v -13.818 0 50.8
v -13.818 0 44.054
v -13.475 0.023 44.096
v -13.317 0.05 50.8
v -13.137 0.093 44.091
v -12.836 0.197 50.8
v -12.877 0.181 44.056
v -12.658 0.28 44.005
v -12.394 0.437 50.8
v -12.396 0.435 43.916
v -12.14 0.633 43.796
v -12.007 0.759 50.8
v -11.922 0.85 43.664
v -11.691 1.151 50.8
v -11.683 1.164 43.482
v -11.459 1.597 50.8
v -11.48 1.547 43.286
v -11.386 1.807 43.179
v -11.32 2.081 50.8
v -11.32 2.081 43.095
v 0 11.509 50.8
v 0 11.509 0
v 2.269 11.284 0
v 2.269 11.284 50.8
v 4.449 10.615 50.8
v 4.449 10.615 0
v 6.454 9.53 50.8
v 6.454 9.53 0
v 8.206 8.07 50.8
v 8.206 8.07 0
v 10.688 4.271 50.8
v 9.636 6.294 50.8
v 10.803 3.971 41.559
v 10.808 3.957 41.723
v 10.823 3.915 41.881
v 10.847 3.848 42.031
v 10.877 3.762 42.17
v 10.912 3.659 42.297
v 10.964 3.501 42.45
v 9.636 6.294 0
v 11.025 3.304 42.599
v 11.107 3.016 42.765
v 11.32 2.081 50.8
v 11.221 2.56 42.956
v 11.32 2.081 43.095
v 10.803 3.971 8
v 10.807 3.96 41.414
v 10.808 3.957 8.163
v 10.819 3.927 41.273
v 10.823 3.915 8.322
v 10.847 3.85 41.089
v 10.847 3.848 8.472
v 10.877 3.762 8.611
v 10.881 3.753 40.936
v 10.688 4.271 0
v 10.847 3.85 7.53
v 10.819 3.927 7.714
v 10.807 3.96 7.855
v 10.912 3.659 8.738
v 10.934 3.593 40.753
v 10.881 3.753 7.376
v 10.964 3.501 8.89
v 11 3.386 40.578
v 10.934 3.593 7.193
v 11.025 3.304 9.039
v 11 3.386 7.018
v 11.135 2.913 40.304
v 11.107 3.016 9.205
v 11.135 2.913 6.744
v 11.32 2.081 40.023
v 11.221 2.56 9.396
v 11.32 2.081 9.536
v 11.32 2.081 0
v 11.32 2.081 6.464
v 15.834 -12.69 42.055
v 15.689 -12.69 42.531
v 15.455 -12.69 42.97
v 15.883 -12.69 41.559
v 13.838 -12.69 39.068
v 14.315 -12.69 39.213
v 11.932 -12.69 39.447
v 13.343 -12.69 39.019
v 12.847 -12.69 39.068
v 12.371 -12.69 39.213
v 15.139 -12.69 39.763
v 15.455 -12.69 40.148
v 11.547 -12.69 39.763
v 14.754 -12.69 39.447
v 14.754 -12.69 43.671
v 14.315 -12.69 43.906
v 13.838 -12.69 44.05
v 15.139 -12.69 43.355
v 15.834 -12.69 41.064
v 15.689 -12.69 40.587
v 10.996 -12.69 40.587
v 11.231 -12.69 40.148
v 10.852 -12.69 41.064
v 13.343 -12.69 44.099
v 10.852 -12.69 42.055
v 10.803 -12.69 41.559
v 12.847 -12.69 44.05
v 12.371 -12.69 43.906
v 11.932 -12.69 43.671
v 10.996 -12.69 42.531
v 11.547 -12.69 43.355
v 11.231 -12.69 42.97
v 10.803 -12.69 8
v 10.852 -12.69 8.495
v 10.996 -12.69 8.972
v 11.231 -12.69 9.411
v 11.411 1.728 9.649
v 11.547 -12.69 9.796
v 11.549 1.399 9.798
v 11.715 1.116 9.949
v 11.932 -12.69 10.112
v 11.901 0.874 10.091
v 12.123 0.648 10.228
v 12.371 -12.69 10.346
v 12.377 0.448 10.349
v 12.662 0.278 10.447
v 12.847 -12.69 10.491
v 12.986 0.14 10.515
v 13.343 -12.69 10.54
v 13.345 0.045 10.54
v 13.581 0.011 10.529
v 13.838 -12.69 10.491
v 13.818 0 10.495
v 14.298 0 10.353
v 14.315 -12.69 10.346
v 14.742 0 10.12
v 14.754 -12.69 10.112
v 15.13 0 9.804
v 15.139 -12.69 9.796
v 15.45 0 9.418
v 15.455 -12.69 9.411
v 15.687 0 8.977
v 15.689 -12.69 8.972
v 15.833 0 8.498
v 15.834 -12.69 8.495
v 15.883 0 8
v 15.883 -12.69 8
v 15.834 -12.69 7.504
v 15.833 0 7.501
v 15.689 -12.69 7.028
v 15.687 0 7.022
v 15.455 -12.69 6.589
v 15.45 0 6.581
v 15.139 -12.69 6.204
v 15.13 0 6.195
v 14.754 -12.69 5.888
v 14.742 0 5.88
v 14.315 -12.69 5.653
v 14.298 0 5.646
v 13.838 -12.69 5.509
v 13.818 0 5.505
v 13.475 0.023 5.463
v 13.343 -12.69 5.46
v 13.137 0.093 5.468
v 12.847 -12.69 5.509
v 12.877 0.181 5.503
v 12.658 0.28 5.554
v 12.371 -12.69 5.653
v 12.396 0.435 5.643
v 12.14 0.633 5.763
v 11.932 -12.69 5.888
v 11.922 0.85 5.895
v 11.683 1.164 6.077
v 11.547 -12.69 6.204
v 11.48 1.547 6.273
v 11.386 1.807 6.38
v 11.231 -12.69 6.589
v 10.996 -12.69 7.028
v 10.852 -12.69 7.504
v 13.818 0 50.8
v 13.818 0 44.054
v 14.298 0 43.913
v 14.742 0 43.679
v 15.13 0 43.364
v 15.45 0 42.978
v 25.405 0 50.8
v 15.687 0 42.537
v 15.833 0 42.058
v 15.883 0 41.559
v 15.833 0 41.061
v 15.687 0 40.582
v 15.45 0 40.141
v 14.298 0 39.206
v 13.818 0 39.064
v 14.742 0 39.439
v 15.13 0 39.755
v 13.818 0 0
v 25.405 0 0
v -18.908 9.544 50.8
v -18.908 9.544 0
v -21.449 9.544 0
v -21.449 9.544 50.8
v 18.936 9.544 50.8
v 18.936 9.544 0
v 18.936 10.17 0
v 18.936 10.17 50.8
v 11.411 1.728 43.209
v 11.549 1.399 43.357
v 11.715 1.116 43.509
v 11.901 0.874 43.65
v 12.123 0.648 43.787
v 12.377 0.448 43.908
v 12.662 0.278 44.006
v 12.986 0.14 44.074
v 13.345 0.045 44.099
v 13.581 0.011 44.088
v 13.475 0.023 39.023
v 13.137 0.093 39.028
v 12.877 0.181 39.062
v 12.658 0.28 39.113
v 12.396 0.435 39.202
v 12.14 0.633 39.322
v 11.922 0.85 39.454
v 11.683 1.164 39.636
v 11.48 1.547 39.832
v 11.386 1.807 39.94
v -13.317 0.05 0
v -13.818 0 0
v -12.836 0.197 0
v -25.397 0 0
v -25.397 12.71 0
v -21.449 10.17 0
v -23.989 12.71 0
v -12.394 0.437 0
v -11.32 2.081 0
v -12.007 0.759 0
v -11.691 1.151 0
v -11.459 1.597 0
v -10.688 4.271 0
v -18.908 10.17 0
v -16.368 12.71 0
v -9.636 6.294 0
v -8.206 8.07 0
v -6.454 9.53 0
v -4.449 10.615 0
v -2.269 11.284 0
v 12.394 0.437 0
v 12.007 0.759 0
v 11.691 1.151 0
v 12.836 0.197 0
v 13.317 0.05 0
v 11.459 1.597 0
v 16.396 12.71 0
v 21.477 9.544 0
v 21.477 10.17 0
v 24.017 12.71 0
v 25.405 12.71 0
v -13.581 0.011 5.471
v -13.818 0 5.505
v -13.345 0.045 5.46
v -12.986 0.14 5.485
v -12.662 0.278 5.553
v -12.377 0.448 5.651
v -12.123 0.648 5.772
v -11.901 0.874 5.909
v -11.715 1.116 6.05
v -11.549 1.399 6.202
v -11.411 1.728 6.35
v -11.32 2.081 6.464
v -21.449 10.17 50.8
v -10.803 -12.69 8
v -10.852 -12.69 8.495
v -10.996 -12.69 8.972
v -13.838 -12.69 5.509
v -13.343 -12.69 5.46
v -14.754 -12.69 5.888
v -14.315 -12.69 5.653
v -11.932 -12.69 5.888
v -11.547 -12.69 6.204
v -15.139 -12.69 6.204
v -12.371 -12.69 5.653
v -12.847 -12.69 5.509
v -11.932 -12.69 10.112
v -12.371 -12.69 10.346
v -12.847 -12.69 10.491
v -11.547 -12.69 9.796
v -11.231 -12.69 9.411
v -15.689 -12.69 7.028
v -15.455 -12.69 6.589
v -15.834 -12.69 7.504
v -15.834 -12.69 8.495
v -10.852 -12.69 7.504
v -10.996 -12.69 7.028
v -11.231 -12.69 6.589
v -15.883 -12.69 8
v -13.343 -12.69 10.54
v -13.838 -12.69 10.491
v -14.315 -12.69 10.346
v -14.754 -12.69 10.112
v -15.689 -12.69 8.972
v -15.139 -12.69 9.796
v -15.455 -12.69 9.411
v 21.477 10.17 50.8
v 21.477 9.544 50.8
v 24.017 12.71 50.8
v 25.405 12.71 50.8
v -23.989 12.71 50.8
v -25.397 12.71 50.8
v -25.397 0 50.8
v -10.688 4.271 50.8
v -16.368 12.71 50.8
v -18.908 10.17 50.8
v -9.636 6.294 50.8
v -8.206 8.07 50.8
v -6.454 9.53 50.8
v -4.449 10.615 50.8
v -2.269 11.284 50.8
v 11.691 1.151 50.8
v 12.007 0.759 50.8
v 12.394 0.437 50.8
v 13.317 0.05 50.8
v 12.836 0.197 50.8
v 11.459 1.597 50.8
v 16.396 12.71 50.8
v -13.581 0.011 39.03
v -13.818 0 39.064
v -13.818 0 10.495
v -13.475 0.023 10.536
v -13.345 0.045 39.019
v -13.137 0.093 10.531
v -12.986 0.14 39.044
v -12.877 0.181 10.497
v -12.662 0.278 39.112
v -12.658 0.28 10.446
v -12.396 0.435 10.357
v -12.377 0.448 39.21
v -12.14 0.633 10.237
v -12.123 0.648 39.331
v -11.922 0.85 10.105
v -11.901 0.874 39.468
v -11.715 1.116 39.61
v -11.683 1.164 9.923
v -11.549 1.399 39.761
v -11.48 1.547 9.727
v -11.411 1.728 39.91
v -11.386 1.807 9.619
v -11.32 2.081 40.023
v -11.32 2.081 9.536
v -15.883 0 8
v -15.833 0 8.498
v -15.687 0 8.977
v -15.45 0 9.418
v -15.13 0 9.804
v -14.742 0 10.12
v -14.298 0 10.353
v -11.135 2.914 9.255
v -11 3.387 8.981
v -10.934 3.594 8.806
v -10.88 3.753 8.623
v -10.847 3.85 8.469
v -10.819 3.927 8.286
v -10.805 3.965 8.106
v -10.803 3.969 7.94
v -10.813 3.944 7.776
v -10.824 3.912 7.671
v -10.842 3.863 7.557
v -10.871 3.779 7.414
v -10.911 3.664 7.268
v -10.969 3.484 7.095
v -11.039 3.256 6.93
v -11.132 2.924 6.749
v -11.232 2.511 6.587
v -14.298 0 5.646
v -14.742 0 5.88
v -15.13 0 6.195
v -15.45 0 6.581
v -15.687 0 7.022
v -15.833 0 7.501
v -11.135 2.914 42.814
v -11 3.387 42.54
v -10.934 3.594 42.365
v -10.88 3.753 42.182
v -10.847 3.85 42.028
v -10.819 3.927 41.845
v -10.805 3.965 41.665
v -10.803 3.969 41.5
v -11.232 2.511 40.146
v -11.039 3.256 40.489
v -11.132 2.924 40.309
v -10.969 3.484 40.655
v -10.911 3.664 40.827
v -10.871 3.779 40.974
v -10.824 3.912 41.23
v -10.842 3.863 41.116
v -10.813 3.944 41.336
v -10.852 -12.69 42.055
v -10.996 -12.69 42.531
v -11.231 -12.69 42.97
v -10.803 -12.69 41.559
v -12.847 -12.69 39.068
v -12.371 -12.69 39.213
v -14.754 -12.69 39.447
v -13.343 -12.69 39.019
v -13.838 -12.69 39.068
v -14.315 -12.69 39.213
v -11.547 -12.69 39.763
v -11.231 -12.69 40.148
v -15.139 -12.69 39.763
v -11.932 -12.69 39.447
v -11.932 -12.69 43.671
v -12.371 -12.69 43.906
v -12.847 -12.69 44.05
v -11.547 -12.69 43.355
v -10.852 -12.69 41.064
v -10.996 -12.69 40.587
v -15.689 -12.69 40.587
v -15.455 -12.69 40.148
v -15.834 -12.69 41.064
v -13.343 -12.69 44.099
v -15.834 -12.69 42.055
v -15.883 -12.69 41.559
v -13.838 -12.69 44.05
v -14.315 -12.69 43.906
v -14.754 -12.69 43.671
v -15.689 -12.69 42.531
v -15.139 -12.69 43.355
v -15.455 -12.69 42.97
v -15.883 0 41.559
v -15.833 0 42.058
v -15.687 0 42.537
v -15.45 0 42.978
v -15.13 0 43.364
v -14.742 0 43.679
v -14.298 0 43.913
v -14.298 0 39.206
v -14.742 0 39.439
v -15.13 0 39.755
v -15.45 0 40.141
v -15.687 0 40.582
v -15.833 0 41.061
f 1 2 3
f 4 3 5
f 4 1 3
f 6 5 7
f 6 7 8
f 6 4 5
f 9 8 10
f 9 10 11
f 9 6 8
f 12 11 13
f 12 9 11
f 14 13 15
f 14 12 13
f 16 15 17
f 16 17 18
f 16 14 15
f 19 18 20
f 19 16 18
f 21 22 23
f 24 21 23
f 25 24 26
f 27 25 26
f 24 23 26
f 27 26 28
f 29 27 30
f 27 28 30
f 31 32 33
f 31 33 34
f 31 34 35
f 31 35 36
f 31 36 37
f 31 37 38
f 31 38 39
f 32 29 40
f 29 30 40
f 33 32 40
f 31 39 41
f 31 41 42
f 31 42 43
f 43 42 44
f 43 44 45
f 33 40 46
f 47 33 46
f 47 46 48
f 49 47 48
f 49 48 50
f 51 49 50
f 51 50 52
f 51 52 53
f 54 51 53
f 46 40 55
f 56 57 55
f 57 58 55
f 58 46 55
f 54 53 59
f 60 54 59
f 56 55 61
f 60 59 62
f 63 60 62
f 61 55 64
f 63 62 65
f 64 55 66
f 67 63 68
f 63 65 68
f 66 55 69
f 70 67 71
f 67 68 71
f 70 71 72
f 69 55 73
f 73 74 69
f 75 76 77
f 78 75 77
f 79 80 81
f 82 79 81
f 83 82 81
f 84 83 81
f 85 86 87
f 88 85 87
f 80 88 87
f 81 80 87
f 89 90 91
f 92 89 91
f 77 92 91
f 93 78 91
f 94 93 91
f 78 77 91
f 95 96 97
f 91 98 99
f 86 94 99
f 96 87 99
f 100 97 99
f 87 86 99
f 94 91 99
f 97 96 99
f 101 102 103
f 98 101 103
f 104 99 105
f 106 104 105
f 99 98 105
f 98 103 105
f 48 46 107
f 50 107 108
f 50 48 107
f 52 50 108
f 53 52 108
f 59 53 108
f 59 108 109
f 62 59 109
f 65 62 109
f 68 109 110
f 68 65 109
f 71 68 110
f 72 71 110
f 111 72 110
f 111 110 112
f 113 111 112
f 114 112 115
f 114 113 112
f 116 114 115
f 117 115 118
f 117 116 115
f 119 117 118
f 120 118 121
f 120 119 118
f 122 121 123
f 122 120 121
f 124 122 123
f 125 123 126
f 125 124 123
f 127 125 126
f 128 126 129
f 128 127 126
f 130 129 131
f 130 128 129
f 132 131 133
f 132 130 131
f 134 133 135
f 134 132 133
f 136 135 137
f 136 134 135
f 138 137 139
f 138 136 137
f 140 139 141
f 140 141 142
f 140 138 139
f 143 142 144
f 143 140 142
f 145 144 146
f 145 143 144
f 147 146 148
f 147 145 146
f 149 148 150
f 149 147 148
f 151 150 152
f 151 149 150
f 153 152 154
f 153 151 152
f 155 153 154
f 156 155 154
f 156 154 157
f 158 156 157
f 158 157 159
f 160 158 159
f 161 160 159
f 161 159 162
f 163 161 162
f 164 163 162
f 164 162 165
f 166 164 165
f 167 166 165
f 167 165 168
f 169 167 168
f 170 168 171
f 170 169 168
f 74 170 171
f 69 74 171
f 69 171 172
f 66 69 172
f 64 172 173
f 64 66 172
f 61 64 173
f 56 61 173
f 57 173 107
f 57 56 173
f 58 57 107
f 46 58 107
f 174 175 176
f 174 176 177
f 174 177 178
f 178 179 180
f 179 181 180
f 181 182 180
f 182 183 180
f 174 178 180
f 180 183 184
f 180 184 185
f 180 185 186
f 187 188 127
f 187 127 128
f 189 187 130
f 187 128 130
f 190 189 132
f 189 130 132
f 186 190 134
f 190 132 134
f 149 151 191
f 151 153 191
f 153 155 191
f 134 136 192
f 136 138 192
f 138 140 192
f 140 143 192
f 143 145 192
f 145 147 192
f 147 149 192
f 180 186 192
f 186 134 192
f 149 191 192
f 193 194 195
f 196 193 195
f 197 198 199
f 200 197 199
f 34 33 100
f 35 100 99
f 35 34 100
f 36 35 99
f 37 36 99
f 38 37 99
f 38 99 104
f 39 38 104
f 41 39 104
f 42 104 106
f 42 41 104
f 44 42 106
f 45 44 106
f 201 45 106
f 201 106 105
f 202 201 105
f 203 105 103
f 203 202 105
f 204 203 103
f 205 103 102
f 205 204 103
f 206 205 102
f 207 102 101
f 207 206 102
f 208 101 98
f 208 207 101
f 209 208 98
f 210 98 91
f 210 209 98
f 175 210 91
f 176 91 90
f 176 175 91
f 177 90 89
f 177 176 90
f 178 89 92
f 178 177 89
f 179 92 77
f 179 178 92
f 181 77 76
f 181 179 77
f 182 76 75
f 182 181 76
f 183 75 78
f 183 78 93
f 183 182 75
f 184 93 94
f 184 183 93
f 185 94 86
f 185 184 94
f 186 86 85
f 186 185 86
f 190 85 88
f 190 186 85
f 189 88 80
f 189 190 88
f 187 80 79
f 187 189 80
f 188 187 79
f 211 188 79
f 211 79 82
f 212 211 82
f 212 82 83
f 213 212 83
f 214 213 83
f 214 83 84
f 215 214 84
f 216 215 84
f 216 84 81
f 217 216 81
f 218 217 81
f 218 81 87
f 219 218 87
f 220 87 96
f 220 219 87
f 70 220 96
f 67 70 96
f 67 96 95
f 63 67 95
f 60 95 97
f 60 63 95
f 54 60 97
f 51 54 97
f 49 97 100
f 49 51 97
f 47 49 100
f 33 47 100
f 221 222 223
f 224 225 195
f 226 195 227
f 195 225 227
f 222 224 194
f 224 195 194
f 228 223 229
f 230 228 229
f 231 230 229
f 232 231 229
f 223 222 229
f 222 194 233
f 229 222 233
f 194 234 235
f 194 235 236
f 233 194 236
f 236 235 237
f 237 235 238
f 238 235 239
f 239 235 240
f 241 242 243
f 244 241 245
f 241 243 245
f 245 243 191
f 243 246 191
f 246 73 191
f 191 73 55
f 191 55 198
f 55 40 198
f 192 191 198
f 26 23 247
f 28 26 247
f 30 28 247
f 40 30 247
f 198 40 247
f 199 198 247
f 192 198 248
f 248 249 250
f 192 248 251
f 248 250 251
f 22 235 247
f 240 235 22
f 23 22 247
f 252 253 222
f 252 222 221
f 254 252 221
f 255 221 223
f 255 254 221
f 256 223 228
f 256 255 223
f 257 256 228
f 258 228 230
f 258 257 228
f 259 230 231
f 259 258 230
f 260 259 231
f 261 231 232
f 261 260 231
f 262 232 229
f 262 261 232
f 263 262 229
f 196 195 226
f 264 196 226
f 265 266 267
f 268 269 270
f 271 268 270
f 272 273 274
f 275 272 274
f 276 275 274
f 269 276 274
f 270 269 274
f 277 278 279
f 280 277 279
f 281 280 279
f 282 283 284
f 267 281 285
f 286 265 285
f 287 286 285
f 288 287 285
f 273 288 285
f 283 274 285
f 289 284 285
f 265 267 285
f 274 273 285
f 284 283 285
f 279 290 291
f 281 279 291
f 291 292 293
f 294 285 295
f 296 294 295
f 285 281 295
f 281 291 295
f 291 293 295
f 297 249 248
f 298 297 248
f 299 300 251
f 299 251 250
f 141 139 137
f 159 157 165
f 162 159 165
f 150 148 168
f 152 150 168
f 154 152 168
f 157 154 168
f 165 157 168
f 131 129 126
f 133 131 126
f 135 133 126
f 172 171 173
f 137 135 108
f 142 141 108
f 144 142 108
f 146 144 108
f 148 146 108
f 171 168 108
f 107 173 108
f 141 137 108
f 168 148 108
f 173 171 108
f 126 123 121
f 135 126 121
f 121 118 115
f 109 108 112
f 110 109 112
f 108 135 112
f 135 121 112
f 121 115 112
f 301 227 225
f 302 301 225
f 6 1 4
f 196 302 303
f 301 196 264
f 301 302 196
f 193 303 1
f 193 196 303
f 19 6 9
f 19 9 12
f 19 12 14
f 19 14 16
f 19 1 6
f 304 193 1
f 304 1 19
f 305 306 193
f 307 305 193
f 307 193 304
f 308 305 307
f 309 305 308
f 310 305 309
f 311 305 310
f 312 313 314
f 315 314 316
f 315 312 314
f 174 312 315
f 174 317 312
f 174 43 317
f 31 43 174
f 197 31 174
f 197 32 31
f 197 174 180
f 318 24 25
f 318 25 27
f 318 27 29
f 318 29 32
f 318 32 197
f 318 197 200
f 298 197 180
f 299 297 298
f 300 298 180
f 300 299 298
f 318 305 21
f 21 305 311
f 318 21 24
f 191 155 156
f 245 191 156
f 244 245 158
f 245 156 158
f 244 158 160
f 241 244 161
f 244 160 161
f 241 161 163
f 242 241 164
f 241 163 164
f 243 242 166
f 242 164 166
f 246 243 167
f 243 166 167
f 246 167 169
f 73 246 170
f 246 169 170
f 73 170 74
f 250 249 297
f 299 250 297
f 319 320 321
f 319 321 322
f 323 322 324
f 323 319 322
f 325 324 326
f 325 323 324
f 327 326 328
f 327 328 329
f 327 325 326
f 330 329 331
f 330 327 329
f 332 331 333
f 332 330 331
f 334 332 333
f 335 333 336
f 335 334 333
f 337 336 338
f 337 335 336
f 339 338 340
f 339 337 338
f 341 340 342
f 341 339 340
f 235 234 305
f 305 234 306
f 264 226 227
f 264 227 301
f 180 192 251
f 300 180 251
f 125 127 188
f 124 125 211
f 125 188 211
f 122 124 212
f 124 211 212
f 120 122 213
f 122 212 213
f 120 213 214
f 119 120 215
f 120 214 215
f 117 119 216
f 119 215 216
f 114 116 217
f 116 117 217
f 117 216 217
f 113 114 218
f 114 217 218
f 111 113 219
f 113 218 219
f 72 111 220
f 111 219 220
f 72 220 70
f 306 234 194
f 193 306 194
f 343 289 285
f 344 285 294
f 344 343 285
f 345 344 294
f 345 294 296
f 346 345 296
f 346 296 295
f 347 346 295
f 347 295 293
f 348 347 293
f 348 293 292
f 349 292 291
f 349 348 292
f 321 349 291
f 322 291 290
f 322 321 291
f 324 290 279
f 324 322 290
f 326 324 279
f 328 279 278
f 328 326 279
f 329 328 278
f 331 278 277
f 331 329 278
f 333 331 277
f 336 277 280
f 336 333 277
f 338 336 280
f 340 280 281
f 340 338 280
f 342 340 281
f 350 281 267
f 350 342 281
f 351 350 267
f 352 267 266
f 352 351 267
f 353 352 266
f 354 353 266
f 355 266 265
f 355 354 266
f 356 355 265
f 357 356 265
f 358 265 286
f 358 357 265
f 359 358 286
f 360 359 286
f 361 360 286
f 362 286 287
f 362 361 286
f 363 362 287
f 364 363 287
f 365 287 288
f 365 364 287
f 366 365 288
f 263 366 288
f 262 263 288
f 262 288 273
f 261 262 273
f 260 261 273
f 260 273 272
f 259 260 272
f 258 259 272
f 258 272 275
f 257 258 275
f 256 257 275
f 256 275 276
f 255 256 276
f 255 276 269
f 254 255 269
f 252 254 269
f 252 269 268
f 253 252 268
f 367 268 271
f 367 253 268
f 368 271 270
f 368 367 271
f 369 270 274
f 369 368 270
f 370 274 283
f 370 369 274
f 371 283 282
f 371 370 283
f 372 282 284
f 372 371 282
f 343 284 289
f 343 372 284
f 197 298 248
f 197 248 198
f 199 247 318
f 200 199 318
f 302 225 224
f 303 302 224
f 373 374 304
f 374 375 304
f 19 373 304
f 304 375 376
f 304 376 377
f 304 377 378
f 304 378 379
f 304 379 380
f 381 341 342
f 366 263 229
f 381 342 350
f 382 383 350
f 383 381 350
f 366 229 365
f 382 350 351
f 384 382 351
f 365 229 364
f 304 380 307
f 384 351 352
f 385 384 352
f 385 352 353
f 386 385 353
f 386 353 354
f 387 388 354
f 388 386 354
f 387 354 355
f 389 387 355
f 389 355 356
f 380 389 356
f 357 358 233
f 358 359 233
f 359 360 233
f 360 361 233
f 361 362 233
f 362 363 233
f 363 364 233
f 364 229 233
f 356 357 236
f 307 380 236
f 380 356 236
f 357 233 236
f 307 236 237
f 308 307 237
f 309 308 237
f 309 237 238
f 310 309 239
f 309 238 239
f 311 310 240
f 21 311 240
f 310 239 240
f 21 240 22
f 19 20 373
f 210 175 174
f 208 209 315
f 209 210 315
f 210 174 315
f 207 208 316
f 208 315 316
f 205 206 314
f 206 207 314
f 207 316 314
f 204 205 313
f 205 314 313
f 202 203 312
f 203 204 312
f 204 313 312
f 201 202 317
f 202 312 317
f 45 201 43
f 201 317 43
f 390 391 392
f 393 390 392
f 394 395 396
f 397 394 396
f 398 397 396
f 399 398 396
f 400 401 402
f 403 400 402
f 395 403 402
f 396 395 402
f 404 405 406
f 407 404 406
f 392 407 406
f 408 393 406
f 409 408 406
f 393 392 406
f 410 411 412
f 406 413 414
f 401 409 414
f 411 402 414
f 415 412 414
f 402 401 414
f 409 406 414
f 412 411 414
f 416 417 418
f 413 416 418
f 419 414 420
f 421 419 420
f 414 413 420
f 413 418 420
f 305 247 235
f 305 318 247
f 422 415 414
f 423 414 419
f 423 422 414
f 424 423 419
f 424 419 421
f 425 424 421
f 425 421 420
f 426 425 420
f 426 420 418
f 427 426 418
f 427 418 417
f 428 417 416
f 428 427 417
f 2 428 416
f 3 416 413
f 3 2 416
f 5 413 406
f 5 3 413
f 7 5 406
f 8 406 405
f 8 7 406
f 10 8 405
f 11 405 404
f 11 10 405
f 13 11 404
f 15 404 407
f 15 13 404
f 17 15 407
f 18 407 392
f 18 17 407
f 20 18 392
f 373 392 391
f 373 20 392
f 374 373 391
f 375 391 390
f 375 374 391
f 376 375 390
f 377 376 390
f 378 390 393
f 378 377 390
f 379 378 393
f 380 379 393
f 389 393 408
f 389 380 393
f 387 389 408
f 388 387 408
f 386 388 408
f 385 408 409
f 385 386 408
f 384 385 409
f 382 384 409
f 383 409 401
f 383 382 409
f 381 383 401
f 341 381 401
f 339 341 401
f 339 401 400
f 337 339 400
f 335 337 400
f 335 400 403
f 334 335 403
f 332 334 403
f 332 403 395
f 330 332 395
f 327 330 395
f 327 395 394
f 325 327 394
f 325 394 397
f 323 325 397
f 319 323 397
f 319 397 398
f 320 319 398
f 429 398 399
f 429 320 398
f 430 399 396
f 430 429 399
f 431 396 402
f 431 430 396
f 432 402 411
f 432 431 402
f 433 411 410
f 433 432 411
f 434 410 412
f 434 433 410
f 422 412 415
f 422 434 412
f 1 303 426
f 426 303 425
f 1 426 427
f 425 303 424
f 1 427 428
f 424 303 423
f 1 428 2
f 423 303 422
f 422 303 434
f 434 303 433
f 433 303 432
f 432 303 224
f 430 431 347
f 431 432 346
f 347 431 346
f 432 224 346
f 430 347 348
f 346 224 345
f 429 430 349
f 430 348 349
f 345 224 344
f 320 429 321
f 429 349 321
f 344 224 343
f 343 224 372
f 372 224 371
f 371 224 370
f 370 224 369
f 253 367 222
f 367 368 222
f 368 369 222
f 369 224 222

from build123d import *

# Parameters (mm, degrees)
F1_DEPTH = 50.8
F2_SIZE  = 2.54
F3_SIZE  = 2.54
F4_SIZE  = 2.54
F5_R     = 2.54
F6_R     = 2.54
F7_DEPTH = 25.4


with BuildPart() as f1:
    # F0 (on Top) → F1 (new body)
    with BuildSketch(Plane.XY):
        with BuildLine():
            Line((-25.396921, 0), (-11.509477, 0))
            ThreePointArc((-11.509477, 0), (-8.138429, 8.138429), (0, 11.509477))
            Line((0, 11.509477), (0, 12.709918))
            Line((0, 12.709918), (-18.907823, 12.709918))
            Line((-18.907823, 12.709918), (-18.907823, 9.544055))
            Line((-18.907823, 9.544055), (-21.449404, 9.544055))
            Line((-21.449404, 9.544055), (-21.449404, 12.709918))
            Line((-21.449404, 12.709918), (-25.396921, 12.709918))
            Line((-25.396921, 12.709918), (-25.396921, 0))
        make_face()
        with BuildLine():
            Line((0, 12.709918), (0, 11.509477))
            ThreePointArc((0, 11.509477), (8.138429, 8.138429), (11.509477, 0))
            Line((11.509477, 0), (25.405249, 0))
            Line((25.405249, 0), (25.405249, 12.709918))
            Line((25.405249, 12.709918), (21.477405, 12.709918))
            Line((21.477405, 12.709918), (21.477405, 9.544055))
            Line((21.477405, 9.544055), (18.936489, 9.544055))
            Line((18.936489, 9.544055), (18.936489, 12.709918))
            Line((18.936489, 12.709918), (0, 12.709918))
        make_face()
    extrude(amount=F1_DEPTH)

    # F2
    f2_edges = [f1.edges().sort_by_distance(p)[0] for p in [
        (21.477405, 12.709918, 25.4),
    ]]
    chamfer(f2_edges, length=F2_SIZE)

    # F3
    f3_edges = [f1.edges().sort_by_distance(p)[0] for p in [
        (-21.449404, 12.709918, 25.4),
        (18.936489, 12.709918, 25.4),
    ]]
    chamfer(f3_edges, length=F3_SIZE)

    # F4
    f4_edges = [f1.edges().sort_by_distance(p)[0] for p in [
        (-18.907823, 12.709918, 25.4),
    ]]
    chamfer(f4_edges, length=F4_SIZE)

    # F5
    f5_edges = [f1.edges().sort_by_distance(p)[0] for p in [
        (-11.509477, 0, 25.4),
        (11.509477, 0, 25.4),
    ]]
    fillet(f5_edges, radius=F5_R)

    # F6 (on face) → F7 (join)
    with BuildSketch(Plane(origin=(0, 12.709918, 0), x_dir=(-1, 0, 0), z_dir=(0, 1, 0))):
        with Locations((-13.342786, 41.559178)):
            Circle(F6_R)
        with Locations((13.342786, 41.559178)):
            Circle(F6_R)
        with Locations((13.342786, 7.999768)):
            Circle(F6_R)
        with Locations((-13.342786, 7.999768)):
            Circle(F6_R)
    extrude(amount=-F7_DEPTH)


solid = f1.part
